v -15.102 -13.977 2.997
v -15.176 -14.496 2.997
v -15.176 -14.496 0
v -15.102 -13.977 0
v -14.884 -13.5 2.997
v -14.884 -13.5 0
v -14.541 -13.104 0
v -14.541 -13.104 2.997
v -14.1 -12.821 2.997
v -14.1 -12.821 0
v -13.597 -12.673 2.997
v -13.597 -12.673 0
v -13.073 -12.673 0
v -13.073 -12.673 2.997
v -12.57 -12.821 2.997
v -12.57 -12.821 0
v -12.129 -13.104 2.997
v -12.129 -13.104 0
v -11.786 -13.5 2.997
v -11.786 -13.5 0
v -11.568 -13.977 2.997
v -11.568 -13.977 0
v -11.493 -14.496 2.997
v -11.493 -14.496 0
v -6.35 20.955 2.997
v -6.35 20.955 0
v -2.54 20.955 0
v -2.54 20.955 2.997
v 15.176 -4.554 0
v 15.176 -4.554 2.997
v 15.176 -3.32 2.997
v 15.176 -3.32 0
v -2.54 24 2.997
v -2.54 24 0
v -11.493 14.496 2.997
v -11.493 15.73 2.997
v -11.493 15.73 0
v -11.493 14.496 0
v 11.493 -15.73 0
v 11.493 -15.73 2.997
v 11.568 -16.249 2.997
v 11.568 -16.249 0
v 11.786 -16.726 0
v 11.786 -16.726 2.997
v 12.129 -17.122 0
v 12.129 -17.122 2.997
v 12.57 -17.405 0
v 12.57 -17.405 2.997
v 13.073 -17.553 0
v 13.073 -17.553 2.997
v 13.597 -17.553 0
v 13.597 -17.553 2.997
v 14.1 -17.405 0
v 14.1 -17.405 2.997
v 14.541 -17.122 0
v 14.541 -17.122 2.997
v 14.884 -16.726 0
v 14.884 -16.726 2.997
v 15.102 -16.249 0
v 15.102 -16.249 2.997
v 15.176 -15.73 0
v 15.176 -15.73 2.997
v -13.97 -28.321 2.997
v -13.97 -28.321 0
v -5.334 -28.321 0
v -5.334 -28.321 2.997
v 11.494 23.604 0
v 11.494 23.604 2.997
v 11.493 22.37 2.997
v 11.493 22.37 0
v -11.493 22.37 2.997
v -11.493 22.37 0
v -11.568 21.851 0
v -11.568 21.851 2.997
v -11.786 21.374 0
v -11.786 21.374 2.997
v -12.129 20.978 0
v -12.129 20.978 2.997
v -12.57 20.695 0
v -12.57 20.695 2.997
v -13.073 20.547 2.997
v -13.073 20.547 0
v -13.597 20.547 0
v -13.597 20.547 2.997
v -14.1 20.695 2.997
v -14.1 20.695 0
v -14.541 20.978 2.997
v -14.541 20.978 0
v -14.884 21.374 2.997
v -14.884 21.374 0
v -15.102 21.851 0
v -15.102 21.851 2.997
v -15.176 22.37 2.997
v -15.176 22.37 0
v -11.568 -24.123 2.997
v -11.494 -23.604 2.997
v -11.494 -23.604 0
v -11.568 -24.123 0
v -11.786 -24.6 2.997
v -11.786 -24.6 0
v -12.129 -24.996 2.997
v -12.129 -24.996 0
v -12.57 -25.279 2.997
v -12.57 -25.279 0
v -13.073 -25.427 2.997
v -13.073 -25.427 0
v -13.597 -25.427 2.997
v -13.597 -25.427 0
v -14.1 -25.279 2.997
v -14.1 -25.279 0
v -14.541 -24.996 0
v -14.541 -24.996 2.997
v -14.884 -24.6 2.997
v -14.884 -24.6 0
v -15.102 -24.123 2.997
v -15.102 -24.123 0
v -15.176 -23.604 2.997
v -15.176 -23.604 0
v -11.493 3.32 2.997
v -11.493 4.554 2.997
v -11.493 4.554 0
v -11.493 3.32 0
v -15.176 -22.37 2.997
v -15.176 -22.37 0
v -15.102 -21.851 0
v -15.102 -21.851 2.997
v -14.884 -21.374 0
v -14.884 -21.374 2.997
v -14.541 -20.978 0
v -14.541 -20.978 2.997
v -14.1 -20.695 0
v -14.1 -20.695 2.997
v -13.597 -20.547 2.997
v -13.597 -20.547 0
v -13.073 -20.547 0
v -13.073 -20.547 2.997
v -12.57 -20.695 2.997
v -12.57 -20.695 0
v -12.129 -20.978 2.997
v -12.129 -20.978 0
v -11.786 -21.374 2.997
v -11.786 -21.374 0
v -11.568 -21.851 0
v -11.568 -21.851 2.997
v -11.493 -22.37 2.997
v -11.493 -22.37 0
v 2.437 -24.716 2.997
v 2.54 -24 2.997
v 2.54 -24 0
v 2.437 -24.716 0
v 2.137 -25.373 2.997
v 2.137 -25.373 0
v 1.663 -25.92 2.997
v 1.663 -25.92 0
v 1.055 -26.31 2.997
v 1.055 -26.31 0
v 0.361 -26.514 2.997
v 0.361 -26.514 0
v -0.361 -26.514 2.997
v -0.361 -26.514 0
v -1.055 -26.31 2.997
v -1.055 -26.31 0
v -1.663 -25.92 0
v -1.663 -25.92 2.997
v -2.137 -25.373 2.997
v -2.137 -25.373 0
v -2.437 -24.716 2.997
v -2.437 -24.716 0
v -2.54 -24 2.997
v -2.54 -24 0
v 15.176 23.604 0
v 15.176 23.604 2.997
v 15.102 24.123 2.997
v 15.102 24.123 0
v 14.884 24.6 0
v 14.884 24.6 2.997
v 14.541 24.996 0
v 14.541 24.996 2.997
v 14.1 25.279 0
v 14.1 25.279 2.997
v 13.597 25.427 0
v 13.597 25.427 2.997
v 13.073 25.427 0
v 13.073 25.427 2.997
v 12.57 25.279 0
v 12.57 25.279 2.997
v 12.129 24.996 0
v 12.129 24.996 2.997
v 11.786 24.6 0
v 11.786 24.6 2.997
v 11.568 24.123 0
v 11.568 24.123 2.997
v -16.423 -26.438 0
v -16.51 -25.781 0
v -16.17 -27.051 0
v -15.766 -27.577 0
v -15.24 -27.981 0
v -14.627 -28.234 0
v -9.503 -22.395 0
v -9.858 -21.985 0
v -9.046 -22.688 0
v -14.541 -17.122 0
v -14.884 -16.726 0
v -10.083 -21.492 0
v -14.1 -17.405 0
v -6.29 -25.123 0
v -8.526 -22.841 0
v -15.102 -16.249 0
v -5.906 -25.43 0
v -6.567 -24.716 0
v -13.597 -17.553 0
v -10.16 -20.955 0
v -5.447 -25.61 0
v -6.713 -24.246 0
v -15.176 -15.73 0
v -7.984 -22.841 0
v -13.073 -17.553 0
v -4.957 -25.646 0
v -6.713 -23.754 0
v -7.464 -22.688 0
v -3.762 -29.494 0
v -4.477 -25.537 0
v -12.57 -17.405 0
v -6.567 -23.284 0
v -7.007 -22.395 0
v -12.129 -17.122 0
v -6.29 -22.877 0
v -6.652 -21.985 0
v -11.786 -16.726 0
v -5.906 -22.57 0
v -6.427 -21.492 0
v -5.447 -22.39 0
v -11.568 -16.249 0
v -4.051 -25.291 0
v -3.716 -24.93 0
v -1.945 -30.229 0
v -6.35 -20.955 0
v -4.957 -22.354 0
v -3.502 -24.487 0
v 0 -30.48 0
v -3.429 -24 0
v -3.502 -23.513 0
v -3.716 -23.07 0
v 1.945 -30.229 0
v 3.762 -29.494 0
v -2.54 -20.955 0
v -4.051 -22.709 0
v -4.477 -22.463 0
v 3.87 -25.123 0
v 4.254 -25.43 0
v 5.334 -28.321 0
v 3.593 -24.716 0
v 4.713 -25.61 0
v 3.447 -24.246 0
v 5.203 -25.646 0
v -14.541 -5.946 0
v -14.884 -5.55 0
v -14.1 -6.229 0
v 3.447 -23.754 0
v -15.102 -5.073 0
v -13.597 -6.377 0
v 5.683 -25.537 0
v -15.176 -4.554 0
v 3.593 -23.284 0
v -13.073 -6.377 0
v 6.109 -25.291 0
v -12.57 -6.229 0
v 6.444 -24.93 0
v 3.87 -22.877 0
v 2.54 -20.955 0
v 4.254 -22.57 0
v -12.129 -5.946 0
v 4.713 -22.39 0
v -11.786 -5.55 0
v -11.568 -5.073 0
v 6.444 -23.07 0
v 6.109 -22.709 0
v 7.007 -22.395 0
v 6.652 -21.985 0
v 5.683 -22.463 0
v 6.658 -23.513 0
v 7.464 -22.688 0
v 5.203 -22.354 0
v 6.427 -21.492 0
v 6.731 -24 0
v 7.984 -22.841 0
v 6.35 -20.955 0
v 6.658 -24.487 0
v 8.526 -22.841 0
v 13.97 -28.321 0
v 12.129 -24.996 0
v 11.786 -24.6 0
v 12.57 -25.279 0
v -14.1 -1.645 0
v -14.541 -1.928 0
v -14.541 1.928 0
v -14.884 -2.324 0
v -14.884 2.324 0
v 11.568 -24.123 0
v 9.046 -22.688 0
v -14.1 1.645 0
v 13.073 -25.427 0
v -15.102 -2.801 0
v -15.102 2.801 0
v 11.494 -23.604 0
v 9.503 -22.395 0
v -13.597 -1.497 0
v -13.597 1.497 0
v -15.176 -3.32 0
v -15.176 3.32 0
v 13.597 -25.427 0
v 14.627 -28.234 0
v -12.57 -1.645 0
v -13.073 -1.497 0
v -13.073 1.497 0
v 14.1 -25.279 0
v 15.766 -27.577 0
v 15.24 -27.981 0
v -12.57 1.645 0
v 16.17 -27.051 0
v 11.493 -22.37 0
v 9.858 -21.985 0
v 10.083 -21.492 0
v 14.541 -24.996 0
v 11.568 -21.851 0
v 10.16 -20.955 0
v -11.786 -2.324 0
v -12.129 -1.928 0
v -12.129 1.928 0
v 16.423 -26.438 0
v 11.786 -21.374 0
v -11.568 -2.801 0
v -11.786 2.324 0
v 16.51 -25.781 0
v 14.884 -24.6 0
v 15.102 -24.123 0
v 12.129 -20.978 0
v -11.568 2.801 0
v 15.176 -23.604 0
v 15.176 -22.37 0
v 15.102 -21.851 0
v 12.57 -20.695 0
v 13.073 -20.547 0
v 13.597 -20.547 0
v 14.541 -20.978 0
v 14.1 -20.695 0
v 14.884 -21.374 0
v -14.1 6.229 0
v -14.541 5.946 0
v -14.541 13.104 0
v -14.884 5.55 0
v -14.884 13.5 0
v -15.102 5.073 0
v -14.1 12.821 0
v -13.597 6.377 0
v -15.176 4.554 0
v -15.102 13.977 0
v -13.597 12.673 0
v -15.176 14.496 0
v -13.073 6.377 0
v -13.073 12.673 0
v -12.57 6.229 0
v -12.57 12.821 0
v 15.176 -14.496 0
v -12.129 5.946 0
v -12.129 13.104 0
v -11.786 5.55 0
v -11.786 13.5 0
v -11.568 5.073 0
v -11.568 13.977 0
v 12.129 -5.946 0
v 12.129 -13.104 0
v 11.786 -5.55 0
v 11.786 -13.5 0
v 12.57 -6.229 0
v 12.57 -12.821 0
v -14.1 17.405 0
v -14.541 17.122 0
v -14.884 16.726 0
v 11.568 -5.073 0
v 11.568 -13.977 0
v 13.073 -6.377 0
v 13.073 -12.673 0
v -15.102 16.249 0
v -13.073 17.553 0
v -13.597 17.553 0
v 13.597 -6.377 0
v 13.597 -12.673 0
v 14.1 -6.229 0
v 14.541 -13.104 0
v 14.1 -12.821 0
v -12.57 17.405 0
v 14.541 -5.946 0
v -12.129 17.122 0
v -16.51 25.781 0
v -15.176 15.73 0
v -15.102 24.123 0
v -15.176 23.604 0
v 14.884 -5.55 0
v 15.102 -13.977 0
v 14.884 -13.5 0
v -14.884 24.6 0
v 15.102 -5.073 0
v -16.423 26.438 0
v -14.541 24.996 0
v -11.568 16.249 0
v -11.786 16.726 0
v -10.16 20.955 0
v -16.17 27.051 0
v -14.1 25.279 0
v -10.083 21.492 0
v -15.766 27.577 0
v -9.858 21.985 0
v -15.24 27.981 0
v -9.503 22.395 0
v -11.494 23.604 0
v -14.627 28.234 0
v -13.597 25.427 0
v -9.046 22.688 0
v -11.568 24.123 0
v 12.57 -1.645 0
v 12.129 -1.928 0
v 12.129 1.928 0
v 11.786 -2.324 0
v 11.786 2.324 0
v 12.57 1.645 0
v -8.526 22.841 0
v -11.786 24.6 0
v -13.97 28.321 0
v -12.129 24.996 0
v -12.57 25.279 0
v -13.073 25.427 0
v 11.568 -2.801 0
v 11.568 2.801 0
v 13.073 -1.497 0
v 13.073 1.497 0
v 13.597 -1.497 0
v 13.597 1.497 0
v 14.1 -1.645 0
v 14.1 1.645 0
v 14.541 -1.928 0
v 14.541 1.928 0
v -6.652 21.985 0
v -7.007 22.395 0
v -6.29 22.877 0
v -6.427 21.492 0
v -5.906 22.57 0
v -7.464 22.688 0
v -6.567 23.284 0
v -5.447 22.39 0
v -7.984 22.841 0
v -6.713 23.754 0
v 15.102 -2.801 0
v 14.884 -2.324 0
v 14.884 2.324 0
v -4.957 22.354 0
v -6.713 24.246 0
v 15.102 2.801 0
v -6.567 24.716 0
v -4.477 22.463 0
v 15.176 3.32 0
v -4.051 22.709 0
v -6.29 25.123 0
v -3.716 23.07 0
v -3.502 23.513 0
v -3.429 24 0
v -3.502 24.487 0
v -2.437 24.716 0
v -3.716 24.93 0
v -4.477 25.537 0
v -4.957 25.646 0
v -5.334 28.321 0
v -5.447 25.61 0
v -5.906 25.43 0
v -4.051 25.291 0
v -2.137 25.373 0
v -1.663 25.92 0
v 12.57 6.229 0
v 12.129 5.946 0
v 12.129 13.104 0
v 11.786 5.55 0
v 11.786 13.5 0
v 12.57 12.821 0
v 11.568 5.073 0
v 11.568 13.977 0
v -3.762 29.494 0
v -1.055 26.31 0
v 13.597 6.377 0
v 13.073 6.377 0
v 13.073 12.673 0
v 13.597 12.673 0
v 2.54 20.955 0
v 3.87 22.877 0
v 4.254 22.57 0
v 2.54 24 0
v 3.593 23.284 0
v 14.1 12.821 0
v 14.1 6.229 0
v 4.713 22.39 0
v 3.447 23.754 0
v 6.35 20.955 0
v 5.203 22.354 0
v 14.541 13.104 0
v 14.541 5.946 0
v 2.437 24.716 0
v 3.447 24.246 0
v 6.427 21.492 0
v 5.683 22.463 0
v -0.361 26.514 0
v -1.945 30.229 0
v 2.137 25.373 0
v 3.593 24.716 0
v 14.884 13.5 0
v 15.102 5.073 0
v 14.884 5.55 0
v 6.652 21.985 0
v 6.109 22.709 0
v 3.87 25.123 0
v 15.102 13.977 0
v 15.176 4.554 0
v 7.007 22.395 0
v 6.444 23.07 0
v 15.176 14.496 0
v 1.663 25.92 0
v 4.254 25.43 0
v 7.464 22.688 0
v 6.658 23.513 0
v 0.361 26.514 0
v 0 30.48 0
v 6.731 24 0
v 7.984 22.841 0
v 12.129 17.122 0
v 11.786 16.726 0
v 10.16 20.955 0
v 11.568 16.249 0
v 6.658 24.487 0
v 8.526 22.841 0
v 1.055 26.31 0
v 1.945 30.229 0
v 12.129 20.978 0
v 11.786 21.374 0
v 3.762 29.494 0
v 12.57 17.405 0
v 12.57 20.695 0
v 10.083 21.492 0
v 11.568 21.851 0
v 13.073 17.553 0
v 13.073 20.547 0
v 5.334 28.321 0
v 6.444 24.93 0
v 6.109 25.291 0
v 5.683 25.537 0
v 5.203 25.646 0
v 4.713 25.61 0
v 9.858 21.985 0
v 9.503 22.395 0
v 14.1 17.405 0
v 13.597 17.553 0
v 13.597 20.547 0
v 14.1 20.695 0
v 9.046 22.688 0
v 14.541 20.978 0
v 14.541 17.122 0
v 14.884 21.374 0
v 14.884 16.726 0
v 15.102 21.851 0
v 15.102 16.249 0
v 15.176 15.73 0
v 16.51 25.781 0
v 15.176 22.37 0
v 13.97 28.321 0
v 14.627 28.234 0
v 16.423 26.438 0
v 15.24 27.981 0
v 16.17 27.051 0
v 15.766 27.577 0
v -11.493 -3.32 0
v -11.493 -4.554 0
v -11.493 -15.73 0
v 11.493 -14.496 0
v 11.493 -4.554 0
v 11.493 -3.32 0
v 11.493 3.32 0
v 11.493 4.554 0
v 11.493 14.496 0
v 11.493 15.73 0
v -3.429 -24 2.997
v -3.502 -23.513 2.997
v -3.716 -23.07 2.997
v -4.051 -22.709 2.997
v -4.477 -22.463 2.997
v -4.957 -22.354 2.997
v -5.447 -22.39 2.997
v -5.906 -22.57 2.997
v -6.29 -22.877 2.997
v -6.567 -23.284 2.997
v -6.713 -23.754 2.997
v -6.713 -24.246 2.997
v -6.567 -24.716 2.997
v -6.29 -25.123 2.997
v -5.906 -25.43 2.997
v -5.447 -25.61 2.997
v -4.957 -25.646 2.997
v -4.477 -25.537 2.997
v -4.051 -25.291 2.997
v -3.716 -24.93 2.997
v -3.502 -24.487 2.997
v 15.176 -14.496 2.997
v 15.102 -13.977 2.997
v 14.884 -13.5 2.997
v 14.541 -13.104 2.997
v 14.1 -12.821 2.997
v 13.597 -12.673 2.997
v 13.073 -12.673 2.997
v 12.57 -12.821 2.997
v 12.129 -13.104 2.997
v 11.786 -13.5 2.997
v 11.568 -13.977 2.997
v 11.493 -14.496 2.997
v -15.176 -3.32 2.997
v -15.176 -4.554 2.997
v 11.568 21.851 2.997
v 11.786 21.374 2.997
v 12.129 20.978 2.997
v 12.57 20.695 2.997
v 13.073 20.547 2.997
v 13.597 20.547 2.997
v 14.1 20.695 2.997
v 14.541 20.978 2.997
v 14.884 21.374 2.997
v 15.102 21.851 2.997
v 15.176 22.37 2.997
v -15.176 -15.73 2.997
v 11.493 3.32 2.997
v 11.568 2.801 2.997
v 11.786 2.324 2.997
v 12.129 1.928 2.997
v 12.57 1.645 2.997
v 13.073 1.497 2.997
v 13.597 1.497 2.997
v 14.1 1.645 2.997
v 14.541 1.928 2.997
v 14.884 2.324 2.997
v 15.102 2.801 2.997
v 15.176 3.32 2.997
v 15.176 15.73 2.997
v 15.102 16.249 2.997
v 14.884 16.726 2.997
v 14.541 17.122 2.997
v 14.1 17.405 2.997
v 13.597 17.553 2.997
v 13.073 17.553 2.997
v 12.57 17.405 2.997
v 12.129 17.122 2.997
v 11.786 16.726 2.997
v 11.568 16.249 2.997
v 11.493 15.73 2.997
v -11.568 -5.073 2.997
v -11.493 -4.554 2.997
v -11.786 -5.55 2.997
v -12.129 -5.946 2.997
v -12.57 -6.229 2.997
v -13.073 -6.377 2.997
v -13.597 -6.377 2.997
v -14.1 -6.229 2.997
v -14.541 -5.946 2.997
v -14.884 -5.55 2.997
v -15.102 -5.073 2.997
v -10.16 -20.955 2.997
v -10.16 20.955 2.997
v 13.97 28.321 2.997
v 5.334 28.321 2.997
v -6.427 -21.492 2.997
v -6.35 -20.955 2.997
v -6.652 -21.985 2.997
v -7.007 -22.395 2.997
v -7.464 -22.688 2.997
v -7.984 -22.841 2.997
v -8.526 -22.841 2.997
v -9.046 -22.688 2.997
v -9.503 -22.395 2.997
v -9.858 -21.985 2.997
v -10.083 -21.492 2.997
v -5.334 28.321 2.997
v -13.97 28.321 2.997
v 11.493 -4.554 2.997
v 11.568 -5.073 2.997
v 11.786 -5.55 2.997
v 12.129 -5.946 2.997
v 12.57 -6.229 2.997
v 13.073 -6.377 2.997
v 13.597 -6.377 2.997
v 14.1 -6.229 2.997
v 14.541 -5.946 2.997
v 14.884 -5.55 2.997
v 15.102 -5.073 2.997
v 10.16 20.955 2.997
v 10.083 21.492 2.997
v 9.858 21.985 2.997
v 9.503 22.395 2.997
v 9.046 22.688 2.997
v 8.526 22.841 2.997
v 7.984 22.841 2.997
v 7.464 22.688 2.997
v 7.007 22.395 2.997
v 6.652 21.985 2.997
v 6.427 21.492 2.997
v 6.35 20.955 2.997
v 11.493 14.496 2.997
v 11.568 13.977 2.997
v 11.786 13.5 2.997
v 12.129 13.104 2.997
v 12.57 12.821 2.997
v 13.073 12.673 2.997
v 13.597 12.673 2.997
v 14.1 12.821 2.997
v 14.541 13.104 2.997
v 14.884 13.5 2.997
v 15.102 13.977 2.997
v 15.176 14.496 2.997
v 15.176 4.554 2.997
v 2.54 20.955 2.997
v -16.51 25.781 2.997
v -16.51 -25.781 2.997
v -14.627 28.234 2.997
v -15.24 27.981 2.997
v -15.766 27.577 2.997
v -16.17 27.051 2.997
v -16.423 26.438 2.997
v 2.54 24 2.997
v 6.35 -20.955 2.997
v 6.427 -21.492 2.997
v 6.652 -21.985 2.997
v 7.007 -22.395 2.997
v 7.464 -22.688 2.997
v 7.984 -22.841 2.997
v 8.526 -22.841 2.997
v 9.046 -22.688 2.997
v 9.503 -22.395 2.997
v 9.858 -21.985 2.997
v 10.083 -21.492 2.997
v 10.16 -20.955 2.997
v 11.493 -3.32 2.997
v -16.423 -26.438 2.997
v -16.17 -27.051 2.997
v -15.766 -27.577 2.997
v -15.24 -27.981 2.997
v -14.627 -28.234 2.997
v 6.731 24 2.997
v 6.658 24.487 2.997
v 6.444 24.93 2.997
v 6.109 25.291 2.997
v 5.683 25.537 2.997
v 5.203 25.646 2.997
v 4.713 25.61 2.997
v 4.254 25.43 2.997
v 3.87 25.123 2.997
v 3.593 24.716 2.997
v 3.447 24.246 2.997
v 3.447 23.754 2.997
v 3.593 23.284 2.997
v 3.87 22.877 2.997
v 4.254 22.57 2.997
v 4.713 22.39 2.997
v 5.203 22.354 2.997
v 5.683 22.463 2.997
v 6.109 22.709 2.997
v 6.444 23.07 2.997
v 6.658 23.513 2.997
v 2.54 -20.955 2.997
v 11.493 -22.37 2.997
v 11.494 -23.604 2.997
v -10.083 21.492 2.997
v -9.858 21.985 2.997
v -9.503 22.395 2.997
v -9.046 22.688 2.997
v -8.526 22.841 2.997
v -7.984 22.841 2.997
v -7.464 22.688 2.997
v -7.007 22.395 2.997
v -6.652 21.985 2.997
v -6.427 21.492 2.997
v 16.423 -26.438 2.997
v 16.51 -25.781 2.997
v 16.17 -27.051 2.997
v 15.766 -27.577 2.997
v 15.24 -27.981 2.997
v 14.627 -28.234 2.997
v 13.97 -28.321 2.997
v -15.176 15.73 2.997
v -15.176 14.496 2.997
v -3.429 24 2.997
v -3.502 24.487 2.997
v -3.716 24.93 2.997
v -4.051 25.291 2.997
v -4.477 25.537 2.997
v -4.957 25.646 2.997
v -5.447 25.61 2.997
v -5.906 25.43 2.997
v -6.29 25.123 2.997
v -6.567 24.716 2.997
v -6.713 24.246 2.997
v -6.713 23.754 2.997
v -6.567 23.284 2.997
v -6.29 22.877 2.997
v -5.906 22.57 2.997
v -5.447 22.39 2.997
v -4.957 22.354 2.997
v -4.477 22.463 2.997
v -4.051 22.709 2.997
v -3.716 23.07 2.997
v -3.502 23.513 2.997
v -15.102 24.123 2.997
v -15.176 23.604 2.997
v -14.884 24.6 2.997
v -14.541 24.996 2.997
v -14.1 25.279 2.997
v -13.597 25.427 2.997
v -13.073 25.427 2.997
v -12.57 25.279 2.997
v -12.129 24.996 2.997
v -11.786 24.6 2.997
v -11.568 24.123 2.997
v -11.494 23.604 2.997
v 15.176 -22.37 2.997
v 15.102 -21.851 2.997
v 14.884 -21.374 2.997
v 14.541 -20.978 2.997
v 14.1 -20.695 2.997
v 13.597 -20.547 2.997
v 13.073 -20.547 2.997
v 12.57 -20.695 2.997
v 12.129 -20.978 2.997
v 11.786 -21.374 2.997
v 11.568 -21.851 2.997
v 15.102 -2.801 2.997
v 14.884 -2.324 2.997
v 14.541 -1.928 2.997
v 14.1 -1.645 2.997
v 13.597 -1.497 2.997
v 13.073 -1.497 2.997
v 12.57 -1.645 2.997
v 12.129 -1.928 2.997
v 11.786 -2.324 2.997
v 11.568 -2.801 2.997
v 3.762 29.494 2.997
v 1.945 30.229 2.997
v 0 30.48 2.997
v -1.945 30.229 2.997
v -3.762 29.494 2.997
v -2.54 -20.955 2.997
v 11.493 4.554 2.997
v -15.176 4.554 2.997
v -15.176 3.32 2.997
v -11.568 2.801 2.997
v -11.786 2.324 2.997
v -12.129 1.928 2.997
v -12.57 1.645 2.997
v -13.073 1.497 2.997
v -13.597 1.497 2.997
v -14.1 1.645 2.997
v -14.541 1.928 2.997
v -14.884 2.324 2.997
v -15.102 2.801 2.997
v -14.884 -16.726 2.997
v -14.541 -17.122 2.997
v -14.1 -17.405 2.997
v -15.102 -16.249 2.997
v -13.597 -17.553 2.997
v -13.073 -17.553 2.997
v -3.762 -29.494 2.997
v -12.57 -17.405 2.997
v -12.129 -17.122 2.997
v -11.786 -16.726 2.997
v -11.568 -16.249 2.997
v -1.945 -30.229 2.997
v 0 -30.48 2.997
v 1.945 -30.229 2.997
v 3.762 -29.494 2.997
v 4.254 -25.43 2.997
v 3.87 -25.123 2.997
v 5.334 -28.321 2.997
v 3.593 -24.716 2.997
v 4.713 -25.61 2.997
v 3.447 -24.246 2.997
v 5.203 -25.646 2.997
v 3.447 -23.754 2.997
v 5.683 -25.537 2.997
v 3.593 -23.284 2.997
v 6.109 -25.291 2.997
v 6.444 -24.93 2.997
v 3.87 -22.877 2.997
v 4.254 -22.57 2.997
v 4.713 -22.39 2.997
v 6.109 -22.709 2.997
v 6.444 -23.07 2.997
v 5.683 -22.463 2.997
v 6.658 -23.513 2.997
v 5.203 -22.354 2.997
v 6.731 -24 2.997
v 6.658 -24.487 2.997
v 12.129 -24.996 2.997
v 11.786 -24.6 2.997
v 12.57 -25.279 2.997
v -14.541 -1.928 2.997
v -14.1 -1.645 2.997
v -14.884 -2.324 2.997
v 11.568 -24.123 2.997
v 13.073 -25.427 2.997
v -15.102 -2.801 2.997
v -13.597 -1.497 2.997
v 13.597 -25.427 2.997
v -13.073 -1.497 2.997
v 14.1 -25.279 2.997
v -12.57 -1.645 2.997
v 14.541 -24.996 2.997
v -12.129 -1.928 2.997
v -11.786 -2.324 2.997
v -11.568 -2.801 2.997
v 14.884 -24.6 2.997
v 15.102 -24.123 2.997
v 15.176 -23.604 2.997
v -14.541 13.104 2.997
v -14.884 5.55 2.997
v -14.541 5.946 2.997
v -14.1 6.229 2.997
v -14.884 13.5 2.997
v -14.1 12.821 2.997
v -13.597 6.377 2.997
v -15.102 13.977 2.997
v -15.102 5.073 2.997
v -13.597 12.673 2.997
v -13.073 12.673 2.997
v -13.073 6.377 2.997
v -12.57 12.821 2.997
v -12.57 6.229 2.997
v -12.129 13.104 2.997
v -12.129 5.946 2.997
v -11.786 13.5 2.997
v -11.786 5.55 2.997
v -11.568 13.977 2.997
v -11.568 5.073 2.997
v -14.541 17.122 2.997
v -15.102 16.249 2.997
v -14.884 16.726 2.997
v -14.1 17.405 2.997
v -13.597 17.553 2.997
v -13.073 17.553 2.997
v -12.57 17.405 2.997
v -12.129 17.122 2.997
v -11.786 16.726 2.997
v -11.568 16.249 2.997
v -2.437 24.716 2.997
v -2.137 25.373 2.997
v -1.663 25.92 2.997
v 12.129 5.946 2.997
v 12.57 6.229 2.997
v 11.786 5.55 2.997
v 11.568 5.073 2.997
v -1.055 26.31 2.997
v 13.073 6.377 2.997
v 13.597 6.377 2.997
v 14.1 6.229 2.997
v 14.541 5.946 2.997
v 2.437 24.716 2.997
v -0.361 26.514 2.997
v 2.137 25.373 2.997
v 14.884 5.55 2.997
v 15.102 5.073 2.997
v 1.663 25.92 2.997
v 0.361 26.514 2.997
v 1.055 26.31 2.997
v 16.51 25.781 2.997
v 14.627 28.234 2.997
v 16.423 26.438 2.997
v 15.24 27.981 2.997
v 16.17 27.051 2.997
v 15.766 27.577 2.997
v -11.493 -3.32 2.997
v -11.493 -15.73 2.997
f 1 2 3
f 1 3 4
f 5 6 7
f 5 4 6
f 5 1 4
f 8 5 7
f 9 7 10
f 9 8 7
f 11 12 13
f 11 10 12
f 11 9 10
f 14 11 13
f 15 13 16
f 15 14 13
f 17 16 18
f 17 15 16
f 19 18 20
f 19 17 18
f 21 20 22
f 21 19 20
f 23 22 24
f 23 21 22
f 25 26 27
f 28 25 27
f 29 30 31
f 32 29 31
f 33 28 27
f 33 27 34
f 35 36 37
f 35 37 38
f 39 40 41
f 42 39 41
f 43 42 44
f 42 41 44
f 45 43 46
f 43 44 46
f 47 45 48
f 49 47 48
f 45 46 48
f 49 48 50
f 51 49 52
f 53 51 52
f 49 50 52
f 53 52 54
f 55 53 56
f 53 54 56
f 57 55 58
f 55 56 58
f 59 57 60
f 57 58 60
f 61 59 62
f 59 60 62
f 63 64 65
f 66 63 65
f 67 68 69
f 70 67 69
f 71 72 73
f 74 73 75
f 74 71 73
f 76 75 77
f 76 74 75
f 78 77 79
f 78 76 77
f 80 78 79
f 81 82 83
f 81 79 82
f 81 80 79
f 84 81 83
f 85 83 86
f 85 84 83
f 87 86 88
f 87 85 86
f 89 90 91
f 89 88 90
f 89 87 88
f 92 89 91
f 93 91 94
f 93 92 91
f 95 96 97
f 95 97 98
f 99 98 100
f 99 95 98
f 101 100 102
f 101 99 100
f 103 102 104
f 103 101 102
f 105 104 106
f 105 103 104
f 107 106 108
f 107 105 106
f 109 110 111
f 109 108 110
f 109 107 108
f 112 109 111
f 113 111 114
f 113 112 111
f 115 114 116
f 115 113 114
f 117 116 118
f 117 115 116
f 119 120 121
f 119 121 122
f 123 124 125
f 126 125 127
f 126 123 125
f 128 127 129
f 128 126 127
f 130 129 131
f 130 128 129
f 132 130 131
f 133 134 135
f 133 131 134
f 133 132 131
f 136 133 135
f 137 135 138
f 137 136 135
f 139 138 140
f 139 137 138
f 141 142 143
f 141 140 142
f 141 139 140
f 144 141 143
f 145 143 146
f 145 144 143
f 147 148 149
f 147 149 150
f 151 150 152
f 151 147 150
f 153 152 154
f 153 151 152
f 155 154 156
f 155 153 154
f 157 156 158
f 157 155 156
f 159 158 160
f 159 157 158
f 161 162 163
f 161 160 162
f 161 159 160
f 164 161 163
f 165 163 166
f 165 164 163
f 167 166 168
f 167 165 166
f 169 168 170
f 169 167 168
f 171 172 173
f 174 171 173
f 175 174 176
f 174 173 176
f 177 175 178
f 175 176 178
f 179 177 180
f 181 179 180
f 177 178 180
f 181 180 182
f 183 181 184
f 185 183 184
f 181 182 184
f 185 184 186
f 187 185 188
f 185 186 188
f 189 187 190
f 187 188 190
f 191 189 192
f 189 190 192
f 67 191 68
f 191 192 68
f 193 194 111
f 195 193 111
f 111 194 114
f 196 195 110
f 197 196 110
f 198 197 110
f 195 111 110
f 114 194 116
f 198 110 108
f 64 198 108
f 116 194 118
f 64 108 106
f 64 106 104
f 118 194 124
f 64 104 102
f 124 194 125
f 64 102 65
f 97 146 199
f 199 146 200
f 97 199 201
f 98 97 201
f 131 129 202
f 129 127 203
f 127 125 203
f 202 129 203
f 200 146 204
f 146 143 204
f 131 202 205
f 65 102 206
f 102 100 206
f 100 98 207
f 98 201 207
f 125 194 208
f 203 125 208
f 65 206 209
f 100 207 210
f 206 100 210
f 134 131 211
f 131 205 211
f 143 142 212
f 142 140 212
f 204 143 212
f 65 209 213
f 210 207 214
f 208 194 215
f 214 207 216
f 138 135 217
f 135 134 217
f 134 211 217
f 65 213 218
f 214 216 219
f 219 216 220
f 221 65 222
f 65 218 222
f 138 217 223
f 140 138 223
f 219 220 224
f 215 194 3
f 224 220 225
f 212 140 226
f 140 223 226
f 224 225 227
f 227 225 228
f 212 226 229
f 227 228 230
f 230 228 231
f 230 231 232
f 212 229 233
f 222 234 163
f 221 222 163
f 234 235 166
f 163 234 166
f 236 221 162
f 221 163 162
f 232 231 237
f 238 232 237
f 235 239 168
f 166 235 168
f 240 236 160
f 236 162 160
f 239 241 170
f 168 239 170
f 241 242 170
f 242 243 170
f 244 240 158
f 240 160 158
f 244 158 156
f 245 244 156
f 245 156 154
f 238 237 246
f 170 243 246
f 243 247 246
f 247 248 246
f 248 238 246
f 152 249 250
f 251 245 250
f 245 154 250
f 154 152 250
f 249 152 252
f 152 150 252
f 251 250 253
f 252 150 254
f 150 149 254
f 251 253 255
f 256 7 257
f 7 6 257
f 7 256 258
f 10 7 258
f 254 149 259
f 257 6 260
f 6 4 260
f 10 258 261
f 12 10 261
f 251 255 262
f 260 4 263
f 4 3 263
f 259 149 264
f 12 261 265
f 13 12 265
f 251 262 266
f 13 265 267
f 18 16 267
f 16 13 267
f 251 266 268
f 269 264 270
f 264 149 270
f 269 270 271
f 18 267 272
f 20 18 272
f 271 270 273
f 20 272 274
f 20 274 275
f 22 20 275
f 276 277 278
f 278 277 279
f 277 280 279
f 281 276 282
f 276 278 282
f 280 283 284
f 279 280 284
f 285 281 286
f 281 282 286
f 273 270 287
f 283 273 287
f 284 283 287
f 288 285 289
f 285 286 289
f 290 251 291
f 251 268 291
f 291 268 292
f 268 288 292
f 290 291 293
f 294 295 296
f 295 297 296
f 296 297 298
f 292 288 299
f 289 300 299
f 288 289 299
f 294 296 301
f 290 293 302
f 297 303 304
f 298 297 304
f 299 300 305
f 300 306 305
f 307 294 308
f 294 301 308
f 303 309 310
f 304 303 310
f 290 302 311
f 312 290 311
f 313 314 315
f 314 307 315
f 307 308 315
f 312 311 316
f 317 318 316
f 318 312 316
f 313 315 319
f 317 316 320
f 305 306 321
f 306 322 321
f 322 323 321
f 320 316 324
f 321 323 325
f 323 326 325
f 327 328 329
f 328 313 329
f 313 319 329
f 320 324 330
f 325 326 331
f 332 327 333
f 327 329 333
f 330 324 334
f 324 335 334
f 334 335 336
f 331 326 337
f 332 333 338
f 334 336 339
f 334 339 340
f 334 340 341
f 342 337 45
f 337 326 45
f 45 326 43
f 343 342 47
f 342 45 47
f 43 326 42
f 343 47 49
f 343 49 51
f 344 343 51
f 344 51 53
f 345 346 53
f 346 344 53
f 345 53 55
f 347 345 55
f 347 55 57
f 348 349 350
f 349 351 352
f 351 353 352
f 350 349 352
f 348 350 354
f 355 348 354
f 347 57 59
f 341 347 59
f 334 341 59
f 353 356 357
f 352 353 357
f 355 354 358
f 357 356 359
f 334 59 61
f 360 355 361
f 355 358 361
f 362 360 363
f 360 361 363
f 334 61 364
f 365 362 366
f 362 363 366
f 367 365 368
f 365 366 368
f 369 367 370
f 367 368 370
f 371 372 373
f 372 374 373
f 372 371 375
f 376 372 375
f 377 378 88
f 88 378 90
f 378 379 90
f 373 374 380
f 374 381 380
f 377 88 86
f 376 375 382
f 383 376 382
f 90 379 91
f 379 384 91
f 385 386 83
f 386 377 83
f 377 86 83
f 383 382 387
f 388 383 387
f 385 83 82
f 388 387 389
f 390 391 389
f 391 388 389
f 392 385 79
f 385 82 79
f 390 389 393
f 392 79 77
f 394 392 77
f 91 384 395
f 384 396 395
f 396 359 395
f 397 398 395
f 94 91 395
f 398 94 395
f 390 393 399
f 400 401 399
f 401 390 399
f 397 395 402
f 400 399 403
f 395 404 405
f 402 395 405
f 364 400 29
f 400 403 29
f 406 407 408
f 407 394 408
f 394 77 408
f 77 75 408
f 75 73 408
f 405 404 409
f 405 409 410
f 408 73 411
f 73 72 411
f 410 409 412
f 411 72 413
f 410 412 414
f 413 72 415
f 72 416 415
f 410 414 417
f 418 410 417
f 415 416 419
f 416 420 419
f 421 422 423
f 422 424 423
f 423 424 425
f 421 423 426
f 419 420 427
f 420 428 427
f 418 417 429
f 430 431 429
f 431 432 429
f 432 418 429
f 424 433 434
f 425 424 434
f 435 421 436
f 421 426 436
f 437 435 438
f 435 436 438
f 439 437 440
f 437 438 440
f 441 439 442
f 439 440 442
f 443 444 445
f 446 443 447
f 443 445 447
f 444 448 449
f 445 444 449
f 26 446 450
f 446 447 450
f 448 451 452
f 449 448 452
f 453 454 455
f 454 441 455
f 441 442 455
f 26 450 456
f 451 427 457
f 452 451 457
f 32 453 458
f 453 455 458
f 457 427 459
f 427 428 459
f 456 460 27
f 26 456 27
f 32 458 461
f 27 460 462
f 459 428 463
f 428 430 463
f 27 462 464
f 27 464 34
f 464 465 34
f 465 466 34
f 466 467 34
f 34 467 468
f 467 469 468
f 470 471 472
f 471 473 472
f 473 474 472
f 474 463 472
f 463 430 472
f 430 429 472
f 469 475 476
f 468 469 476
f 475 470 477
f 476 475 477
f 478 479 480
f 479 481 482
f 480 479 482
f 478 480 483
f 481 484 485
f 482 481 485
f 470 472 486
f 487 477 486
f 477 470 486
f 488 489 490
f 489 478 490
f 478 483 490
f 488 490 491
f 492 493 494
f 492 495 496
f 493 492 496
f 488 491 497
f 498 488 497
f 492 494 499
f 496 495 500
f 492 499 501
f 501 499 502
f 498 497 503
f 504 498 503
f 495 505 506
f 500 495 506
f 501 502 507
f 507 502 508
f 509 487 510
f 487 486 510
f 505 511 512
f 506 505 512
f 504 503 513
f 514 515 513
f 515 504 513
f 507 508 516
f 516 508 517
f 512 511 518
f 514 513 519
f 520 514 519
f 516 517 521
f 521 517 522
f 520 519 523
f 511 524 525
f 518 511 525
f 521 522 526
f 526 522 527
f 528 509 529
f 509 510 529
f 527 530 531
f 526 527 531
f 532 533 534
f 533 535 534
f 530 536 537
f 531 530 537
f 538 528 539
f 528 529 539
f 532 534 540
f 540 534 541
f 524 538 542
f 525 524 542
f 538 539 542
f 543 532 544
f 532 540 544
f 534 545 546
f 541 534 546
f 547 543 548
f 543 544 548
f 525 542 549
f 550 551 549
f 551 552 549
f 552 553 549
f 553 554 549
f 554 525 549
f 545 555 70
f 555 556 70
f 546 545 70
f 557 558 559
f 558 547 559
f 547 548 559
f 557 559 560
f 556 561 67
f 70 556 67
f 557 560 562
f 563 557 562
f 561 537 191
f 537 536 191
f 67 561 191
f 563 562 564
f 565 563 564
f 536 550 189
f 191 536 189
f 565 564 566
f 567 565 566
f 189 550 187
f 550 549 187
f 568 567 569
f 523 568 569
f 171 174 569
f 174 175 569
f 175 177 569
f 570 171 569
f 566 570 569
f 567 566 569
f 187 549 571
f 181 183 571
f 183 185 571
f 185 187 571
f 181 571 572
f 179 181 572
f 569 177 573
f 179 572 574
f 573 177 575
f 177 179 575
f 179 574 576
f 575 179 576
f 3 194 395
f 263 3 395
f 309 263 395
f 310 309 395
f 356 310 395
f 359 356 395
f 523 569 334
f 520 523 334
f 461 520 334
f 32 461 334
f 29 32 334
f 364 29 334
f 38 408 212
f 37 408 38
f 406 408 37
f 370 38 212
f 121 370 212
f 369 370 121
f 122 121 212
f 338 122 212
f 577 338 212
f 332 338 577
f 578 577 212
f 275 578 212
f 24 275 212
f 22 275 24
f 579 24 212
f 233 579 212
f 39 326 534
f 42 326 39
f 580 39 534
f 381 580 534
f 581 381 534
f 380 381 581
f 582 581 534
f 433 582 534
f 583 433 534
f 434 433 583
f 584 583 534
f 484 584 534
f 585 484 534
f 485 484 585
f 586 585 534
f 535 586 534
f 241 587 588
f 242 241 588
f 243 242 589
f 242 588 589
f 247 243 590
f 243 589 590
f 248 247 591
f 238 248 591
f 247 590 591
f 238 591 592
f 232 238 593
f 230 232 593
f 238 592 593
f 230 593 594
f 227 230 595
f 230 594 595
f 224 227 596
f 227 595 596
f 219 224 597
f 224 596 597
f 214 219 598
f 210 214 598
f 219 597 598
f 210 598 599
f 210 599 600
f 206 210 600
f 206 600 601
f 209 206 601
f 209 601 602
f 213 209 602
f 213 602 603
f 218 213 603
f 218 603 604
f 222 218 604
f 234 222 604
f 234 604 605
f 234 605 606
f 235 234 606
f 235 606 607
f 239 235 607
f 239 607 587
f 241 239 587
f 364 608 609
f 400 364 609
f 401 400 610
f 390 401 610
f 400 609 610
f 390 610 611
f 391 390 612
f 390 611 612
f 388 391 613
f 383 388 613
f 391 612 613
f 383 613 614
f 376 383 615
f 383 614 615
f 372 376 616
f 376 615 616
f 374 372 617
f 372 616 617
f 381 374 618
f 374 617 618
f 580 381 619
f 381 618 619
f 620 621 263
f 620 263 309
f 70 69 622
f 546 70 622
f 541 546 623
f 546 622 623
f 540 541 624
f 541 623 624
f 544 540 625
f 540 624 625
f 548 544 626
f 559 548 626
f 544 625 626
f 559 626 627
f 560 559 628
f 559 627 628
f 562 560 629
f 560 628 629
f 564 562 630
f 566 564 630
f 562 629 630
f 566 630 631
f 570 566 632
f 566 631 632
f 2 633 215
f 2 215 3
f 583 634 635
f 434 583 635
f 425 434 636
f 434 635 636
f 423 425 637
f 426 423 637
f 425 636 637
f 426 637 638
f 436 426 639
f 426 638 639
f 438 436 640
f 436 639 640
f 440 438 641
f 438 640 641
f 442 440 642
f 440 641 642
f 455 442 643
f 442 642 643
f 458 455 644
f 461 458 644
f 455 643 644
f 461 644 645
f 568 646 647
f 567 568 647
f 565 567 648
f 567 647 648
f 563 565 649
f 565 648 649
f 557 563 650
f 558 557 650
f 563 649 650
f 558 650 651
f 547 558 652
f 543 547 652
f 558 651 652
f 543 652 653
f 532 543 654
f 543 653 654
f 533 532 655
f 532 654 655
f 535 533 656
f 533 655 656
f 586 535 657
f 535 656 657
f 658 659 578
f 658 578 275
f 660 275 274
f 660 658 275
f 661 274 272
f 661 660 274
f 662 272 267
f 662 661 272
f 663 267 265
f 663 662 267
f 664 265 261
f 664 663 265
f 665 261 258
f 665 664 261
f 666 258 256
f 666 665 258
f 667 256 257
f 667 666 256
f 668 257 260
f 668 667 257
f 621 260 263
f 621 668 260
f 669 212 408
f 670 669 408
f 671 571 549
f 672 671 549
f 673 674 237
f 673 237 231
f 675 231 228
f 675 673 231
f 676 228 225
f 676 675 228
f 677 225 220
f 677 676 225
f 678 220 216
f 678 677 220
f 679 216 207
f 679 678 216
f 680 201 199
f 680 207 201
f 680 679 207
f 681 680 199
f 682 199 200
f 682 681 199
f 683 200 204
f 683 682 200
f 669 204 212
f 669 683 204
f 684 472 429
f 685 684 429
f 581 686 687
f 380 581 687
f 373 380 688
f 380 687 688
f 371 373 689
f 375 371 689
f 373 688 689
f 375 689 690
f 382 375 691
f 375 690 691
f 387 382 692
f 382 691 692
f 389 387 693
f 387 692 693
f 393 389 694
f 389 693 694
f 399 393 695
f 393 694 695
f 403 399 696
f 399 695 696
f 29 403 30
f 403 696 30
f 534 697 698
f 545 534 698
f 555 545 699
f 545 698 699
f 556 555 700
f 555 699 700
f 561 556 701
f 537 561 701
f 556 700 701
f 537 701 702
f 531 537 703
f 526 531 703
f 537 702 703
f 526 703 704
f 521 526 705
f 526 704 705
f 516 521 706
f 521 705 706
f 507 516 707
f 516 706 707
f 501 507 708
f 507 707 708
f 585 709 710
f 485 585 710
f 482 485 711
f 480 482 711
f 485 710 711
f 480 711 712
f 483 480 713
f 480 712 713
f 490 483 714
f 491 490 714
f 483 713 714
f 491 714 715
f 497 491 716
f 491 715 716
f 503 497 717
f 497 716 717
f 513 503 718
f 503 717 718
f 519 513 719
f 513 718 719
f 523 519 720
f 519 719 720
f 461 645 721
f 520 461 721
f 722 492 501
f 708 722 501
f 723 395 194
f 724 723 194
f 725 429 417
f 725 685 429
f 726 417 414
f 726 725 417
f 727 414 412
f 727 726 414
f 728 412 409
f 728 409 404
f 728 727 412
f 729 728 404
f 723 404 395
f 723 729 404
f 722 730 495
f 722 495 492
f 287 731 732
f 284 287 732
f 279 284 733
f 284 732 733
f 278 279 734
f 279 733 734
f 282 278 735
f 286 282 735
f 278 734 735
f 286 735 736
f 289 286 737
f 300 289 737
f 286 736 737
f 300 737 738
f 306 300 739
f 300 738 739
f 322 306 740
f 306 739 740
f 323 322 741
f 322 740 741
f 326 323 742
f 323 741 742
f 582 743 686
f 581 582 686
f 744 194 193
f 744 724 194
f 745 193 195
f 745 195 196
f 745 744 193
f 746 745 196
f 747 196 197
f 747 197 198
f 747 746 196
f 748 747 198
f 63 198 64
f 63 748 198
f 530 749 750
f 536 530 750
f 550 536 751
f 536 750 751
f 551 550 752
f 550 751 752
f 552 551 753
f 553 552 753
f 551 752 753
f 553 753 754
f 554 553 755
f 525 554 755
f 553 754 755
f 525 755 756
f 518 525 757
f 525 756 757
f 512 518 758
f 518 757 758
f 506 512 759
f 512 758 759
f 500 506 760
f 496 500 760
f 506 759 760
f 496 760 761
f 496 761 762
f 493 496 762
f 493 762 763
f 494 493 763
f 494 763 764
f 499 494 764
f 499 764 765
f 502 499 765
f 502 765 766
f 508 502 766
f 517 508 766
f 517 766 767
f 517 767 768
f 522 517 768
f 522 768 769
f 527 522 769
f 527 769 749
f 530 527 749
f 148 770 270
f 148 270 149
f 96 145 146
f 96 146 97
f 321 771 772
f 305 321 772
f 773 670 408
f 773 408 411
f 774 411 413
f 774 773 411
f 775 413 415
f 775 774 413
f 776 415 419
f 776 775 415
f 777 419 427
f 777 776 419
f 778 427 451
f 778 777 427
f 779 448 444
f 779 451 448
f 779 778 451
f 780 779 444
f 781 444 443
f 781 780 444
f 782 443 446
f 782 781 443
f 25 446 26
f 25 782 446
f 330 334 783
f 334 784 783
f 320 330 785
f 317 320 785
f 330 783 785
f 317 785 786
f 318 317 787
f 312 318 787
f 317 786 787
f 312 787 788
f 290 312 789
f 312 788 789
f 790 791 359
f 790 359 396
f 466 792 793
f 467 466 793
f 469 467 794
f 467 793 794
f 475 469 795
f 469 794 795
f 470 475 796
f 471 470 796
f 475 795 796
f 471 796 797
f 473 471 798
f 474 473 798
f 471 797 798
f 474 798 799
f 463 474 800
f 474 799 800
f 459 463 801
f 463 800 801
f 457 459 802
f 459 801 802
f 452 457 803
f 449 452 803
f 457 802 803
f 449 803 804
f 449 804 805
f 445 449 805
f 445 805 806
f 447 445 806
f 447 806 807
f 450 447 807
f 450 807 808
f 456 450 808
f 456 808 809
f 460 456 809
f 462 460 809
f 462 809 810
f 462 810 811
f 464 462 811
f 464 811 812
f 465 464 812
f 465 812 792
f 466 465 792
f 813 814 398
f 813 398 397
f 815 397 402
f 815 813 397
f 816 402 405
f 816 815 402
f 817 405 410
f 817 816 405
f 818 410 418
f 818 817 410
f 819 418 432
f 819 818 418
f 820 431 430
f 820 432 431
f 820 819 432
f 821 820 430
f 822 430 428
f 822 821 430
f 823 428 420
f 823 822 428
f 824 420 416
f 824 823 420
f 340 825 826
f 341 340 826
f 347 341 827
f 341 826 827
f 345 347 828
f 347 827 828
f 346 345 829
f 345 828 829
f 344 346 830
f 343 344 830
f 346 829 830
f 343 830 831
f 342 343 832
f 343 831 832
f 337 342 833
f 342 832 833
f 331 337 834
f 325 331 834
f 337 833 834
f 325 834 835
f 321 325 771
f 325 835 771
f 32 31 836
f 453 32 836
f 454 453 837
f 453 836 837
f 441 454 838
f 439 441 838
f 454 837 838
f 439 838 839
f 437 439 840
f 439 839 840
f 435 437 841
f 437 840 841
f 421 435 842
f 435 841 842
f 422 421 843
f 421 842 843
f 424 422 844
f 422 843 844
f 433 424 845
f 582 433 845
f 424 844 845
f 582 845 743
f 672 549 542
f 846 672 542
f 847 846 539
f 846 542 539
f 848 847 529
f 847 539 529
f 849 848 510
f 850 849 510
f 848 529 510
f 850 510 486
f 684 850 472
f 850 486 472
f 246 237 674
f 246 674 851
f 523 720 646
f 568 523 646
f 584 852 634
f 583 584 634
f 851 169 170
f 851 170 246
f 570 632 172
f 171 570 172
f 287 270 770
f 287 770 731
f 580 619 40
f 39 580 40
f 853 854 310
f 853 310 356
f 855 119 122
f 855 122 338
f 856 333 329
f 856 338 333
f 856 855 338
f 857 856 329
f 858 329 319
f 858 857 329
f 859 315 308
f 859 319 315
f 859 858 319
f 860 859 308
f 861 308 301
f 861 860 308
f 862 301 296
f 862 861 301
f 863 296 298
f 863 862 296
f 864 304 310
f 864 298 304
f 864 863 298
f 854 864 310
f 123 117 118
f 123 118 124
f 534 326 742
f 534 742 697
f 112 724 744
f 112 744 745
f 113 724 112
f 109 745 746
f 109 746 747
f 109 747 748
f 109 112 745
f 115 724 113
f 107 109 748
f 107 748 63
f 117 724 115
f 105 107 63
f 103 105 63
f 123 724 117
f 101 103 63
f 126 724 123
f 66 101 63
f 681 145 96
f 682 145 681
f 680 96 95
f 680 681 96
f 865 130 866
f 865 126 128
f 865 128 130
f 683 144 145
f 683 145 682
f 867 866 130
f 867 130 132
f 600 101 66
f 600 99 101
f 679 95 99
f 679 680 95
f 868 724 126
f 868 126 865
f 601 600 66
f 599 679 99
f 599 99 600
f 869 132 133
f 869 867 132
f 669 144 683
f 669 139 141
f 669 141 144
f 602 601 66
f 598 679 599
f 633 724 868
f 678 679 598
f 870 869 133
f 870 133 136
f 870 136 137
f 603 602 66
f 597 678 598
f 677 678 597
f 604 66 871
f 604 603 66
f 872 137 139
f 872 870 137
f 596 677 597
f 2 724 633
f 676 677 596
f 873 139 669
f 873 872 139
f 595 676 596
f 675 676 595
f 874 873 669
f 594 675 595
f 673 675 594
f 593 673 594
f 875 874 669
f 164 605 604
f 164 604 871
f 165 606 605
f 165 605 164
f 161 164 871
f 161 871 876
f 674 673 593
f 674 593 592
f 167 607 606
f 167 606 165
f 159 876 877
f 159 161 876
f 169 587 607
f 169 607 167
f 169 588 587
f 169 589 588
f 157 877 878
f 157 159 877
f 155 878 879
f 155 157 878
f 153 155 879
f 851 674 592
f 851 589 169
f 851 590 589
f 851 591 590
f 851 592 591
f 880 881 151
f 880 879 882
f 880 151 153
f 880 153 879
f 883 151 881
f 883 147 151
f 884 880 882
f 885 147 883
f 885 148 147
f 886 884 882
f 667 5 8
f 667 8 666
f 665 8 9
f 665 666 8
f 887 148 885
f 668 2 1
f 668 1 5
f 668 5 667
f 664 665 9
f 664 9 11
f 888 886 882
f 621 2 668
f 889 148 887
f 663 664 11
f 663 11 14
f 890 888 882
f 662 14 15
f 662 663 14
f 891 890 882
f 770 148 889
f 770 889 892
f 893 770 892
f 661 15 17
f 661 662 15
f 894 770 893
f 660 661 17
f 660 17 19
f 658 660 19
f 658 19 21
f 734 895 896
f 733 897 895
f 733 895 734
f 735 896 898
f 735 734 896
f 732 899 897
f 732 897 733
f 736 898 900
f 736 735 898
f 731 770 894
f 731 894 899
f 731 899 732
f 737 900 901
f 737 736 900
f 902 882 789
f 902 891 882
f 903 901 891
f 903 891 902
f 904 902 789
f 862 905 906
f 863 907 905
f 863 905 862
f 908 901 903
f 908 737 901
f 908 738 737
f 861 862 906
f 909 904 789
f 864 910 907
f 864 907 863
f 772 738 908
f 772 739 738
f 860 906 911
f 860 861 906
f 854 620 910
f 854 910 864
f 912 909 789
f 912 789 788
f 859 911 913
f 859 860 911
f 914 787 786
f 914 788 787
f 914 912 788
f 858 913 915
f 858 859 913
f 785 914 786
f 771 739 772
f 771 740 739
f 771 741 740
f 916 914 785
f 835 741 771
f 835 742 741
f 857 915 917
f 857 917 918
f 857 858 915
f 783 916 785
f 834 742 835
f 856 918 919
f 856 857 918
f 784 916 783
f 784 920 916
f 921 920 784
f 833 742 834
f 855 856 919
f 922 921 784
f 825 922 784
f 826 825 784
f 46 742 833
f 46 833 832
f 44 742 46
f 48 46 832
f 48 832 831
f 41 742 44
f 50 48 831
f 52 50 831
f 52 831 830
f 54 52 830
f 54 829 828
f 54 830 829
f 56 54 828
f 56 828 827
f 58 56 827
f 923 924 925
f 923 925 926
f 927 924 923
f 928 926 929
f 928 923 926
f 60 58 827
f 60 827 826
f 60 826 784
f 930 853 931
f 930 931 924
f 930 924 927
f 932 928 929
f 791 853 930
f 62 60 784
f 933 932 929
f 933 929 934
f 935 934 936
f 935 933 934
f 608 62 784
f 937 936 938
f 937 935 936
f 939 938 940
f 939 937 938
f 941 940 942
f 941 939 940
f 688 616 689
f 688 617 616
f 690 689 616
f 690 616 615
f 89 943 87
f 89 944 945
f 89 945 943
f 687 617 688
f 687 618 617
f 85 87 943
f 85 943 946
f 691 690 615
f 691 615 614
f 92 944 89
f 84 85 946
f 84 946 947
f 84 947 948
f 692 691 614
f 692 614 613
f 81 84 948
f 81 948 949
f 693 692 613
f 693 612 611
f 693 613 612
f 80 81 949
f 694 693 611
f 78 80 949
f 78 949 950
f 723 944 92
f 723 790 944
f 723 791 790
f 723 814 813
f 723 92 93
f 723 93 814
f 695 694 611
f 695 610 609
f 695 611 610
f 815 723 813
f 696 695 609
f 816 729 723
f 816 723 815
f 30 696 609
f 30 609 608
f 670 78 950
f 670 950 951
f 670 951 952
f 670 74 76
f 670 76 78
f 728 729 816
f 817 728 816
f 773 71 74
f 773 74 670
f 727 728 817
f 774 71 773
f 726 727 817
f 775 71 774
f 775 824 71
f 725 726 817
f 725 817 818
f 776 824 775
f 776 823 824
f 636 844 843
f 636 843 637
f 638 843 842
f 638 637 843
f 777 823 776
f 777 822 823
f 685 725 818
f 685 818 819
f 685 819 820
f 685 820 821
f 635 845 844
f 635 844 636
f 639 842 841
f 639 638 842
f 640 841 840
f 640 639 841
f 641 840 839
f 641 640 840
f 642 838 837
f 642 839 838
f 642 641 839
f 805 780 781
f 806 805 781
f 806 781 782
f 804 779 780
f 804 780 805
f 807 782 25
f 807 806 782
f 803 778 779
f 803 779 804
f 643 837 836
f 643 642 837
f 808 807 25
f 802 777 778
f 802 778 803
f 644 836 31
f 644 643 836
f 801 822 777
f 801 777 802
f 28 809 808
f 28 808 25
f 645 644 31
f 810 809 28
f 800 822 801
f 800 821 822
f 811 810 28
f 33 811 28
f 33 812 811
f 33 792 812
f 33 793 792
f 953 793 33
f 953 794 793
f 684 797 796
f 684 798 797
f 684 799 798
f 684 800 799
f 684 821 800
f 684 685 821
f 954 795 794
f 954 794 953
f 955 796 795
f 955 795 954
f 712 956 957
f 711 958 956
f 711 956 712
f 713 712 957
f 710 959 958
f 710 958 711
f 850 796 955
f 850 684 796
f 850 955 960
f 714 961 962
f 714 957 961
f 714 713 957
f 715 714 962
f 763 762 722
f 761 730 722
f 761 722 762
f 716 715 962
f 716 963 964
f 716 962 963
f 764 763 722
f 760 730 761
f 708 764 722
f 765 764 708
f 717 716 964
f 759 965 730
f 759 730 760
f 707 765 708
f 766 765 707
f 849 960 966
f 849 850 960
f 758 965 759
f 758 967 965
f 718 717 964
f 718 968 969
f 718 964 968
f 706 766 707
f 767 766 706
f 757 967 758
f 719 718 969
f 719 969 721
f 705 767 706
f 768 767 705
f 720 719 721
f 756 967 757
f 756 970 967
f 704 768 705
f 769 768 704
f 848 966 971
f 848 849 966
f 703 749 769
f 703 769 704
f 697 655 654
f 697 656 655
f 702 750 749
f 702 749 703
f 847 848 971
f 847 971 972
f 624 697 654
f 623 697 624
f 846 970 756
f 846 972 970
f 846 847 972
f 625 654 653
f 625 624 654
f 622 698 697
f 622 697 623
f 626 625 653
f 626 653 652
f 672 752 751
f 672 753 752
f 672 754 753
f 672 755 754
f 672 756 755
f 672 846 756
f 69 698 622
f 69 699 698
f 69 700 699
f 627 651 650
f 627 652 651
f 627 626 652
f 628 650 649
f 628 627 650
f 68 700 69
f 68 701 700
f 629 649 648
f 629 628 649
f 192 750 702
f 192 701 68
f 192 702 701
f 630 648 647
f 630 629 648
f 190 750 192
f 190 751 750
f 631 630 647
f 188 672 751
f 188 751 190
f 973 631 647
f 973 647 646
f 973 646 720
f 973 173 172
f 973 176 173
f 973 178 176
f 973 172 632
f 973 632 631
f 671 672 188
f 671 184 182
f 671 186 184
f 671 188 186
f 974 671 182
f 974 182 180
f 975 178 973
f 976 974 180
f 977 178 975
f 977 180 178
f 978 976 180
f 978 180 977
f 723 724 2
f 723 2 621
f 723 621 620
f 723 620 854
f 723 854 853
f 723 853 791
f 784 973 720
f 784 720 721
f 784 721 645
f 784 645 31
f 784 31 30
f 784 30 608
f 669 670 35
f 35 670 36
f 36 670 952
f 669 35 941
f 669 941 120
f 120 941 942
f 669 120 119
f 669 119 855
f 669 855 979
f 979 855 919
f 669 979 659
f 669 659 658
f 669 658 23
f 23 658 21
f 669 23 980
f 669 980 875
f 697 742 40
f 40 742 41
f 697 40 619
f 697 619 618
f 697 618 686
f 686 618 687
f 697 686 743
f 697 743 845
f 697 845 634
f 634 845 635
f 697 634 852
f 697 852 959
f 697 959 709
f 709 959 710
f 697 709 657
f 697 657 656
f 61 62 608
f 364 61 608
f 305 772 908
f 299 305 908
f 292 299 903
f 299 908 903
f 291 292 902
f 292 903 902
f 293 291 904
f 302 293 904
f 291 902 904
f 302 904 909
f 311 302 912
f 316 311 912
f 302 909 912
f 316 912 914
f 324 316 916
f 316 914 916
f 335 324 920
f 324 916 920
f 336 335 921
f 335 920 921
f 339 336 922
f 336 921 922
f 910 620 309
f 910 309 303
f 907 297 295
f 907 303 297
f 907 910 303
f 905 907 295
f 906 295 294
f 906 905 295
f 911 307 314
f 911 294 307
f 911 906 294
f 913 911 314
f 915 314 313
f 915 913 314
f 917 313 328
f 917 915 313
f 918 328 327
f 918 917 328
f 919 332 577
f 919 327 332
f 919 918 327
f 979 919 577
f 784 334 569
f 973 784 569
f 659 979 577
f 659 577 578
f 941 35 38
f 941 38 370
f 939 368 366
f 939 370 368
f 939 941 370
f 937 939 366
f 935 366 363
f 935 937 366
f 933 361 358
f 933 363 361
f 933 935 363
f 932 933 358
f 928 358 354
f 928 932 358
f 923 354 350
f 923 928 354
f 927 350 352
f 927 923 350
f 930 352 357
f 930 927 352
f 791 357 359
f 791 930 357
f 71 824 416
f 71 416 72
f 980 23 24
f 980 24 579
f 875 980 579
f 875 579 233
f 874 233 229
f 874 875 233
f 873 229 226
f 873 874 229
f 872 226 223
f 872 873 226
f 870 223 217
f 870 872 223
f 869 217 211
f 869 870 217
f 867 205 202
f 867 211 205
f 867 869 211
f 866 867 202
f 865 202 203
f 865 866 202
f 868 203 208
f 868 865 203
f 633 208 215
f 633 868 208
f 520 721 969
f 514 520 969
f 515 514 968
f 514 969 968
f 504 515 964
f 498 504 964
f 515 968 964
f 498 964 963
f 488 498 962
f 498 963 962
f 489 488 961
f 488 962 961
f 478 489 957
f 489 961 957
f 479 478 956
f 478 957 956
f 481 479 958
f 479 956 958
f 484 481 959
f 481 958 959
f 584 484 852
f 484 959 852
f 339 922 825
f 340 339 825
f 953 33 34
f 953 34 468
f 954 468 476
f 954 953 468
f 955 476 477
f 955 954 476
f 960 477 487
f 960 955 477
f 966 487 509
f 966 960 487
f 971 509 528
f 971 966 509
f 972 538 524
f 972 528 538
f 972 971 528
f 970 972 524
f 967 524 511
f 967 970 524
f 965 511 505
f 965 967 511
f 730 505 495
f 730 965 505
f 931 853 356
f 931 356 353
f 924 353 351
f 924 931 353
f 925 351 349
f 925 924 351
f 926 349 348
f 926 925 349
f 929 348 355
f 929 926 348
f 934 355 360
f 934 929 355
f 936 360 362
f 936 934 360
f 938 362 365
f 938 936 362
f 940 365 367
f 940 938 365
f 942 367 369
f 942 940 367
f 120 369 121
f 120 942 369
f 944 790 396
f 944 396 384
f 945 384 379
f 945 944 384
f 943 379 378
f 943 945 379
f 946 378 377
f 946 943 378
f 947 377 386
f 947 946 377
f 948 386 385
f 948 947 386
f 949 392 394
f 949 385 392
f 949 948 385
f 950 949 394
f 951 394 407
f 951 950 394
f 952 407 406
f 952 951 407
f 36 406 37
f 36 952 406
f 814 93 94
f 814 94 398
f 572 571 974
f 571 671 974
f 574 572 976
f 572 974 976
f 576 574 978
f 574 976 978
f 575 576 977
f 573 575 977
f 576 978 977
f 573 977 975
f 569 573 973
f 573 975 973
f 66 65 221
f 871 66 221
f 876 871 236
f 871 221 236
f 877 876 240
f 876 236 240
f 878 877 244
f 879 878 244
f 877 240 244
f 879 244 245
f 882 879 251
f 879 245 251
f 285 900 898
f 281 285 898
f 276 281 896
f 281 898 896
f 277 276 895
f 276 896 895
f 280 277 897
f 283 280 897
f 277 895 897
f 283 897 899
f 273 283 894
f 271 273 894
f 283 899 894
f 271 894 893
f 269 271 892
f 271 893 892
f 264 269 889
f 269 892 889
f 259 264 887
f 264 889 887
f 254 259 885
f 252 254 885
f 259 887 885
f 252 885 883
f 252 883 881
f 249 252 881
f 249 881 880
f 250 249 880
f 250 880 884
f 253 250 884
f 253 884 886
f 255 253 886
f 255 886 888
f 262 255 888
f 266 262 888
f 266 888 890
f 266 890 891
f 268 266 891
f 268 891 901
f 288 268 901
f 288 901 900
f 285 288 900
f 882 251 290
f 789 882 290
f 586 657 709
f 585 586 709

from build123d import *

# Parameters (mm, degrees)
SKETCH1_W           = 20.32
SKETCH1_H           = 41.91
BOSS_EXTRUDE1_DEPTH = 2.9972
SKETCH2_R           = 1.651
CUT_EXTRUDE1_DEPTH  = 35.793587165
CUT_EXTRUDE2_DEPTH  = 35.793587165
FILLET1_R           = 2.54


with BuildPart() as part:
    # Sketch1 → Boss-Extrude1 (new body)
    with BuildSketch(Plane.XY):
        with BuildLine():
            Line((16.51, 28.321), (5.334, 28.321))
            ThreePointArc((5.334, 28.321), (0, 30.48), (-5.334, 28.321))
            Line((-5.334, 28.321), (-16.51, 28.321))
            Line((-16.51, 28.321), (-16.51, -28.321))
            Line((-16.51, -28.321), (-5.334, -28.321))
            ThreePointArc((-5.334, -28.321), (0, -30.48), (5.334, -28.321))
            Line((5.334, -28.321), (16.51, -28.321))
            Line((16.51, -28.321), (16.51, 28.321))
        make_face()
        Rectangle(SKETCH1_W, SKETCH1_H, mode=Mode.SUBTRACT)
    extrude(amount=BOSS_EXTRUDE1_DEPTH)

    # Sketch2 → Cut-Extrude1 (cut, through all)
    with BuildSketch(Plane.XY.offset(2.9972)):
        with Locations((-5.08, 24)):
            Circle(SKETCH2_R)
        with Locations((5.08, 24)):
            Circle(SKETCH2_R)
        with Locations((5.08, -24)):
            Circle(SKETCH2_R)
        with Locations((-5.08, -24)):
            Circle(SKETCH2_R)
        with BuildLine():
            Line((-6.35, 20.955), (-6.35, -20.955))
            ThreePointArc((-6.35, -20.955), (-8.255, -22.86), (-10.16, -20.955))
            Line((-10.16, -20.955), (-10.16, 20.955))
            ThreePointArc((-10.16, 20.955), (-8.255, 22.86), (-6.35, 20.955))
        make_face()
        with BuildLine():
            Line((6.35, 20.955), (6.35, -20.955))
            ThreePointArc((6.35, -20.955), (8.255, -22.86), (10.16, -20.955))
            Line((10.16, -20.955), (10.16, 20.955))
            ThreePointArc((10.16, 20.955), (8.255, 22.86), (6.35, 20.955))
        make_face()
        with BuildLine():
            Line((-2.54, -24), (-2.54, 24))
            ThreePointArc((-2.54, 24), (0, 26.54), (2.54, 24))
            Line((2.54, 24), (2.54, -24))
            ThreePointArc((2.54, -24), (0, -26.54), (-2.54, -24))
        make_face()
    extrude(amount=-CUT_EXTRUDE1_DEPTH, mode=Mode.SUBTRACT)

    # Sketch3 → Cut-Extrude2 (cut, through all)
    with BuildSketch(Plane.XY.offset(2.9972)):
        with BuildLine():
            Line((-11.4935, 23.604394695), (-11.4935, 22.369605305))
            ThreePointArc((-11.4935, 22.369605305), (-13.335, 20.528105305), (-15.1765, 22.369605305))
            Line((-15.1765, 22.369605305), (-15.1765, 23.604394695))
            ThreePointArc((-15.1765, 23.604394695), (-13.335, 25.445894695), (-11.4935, 23.604394695))
        make_face()
        with BuildLine():
            Line((-11.4935, 15.730394695), (-11.4935, 14.495605305))
            ThreePointArc((-11.4935, 14.495605305), (-13.335, 12.654105305), (-15.1765, 14.495605305))
            Line((-15.1765, 14.495605305), (-15.1765, 15.730394695))
            ThreePointArc((-15.1765, 15.730394695), (-13.335, 17.571894695), (-11.4935, 15.730394695))
        make_face()
        with BuildLine():
            Line((-11.4935, 4.554394695), (-11.4935, 3.319605305))
            ThreePointArc((-11.4935, 3.319605305), (-13.335, 1.478105305), (-15.1765, 3.319605305))
            Line((-15.1765, 3.319605305), (-15.1765, 4.554394695))
            ThreePointArc((-15.1765, 4.554394695), (-13.335, 6.395894695), (-11.4935, 4.554394695))
        make_face()
        with BuildLine():
            Line((-11.4935, -3.319605305), (-11.4935, -4.554394695))
            ThreePointArc((-11.4935, -4.554394695), (-13.335, -6.395894695), (-15.1765, -4.554394695))
            Line((-15.1765, -4.554394695), (-15.1765, -3.319605305))
            ThreePointArc((-15.1765, -3.319605305), (-13.335, -1.478105305), (-11.4935, -3.319605305))
        make_face()
        with BuildLine():
            Line((-11.4935, -14.495605305), (-11.4935, -15.730394695))
            ThreePointArc((-11.4935, -15.730394695), (-13.335, -17.571894695), (-15.1765, -15.730394695))
            Line((-15.1765, -15.730394695), (-15.1765, -14.495605305))
            ThreePointArc((-15.1765, -14.495605305), (-13.335, -12.654105305), (-11.4935, -14.495605305))
        make_face()
        with BuildLine():
            Line((-11.4935, -22.369605305), (-11.4935, -23.604394695))
            ThreePointArc((-11.4935, -23.604394695), (-13.335, -25.445894695), (-15.1765, -23.604394695))
            Line((-15.1765, -23.604394695), (-15.1765, -22.369605305))
            ThreePointArc((-15.1765, -22.369605305), (-13.335, -20.528105305), (-11.4935, -22.369605305))
        make_face()
    cut_extrude2 = extrude(amount=-CUT_EXTRUDE2_DEPTH, mode=Mode.SUBTRACT)

    # Mirror1: Cut-Extrude2 across plane
    add(cut_extrude2.mirror(Plane(origin=(0, 0, 0), x_dir=(0, 0, 1), z_dir=(1, 0, 0))), mode=Mode.SUBTRACT)

    # Fillet1
    fillet1_edges = [part.edges().sort_by_distance(p)[0] for p in [
        (-16.51, -28.321, 1.4986),
        (-16.51, 28.321, 1.4986),
        (16.51, 28.321, 1.4986),
        (16.51, -28.321, 1.4986),
    ]]
    fillet(fillet1_edges, radius=FILLET1_R)


solid = part.part
